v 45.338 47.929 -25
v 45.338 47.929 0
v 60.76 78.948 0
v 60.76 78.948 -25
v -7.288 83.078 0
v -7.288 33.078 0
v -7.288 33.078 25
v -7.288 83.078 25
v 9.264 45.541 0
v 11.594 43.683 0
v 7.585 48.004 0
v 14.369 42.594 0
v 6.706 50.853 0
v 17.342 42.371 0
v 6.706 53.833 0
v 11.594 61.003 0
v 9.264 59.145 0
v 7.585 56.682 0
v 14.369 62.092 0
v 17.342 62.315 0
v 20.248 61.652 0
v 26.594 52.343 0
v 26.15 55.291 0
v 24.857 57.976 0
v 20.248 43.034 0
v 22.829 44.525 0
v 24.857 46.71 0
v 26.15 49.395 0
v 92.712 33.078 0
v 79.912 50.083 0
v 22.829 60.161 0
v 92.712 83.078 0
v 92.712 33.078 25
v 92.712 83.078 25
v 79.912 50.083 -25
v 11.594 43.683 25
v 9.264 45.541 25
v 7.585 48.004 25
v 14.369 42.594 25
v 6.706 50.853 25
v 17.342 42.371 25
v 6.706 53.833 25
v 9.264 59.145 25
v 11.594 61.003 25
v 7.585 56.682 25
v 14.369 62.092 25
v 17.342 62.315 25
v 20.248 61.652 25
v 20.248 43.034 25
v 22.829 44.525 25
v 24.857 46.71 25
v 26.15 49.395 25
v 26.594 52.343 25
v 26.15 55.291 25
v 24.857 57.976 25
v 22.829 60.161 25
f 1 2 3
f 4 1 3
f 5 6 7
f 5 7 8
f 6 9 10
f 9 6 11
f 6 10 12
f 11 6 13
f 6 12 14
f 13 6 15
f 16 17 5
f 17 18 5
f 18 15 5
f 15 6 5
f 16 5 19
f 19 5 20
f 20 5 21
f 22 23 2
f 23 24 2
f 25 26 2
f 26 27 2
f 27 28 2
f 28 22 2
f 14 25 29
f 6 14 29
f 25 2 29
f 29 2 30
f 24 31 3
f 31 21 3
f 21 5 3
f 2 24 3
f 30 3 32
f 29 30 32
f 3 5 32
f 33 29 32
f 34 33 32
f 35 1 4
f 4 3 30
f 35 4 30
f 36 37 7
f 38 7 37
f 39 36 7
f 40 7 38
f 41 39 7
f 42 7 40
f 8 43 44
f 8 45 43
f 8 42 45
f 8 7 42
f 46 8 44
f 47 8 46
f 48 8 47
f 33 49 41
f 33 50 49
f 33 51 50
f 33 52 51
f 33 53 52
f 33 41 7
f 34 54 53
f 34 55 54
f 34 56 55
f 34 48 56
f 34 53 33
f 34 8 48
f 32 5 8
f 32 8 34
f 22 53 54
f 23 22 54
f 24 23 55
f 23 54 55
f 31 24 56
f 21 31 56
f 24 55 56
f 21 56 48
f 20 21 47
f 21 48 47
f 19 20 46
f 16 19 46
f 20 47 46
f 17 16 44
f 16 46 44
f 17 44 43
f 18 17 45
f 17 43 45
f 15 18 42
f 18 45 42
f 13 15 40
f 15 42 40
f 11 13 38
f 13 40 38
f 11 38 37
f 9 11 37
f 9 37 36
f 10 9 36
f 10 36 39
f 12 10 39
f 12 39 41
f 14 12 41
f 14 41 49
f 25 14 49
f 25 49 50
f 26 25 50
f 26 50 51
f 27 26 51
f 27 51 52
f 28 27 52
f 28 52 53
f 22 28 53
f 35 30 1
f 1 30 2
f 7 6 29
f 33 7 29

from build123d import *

# Parameters (mm, degrees)
F0_W     = 100
F0_H     = 50
F1_DEPTH = 25
F2_R     = 10
F3_DEPTH = 25.001
F5_DEPTH = 25


with BuildPart() as f1:
    # F0 (on Top) → F1 (new body)
    with BuildSketch(Plane.XY):
        with Locations((42.712342, 58.077995)):
            Rectangle(F0_W, F0_H)
    extrude(amount=F1_DEPTH)

    # F2 (on face) → F3 (cut, through all)
    with BuildSketch(Plane.XY.offset(25)):
        with Locations((16.594408, 52.342981)):
            Circle(F2_R)
    extrude(amount=-F3_DEPTH, mode=Mode.SUBTRACT)

    # F4 (on face) → F5 (join)
    with BuildSketch(Plane(origin=(0, 0, 0), x_dir=(1, 0, 0), z_dir=(0, 0, -1))):
        Polygon((45.338004, -47.928774), (60.75959, -78.947715), (79.911988, -50.082759), align=None)
    extrude(amount=F5_DEPTH)


solid = f1.part
